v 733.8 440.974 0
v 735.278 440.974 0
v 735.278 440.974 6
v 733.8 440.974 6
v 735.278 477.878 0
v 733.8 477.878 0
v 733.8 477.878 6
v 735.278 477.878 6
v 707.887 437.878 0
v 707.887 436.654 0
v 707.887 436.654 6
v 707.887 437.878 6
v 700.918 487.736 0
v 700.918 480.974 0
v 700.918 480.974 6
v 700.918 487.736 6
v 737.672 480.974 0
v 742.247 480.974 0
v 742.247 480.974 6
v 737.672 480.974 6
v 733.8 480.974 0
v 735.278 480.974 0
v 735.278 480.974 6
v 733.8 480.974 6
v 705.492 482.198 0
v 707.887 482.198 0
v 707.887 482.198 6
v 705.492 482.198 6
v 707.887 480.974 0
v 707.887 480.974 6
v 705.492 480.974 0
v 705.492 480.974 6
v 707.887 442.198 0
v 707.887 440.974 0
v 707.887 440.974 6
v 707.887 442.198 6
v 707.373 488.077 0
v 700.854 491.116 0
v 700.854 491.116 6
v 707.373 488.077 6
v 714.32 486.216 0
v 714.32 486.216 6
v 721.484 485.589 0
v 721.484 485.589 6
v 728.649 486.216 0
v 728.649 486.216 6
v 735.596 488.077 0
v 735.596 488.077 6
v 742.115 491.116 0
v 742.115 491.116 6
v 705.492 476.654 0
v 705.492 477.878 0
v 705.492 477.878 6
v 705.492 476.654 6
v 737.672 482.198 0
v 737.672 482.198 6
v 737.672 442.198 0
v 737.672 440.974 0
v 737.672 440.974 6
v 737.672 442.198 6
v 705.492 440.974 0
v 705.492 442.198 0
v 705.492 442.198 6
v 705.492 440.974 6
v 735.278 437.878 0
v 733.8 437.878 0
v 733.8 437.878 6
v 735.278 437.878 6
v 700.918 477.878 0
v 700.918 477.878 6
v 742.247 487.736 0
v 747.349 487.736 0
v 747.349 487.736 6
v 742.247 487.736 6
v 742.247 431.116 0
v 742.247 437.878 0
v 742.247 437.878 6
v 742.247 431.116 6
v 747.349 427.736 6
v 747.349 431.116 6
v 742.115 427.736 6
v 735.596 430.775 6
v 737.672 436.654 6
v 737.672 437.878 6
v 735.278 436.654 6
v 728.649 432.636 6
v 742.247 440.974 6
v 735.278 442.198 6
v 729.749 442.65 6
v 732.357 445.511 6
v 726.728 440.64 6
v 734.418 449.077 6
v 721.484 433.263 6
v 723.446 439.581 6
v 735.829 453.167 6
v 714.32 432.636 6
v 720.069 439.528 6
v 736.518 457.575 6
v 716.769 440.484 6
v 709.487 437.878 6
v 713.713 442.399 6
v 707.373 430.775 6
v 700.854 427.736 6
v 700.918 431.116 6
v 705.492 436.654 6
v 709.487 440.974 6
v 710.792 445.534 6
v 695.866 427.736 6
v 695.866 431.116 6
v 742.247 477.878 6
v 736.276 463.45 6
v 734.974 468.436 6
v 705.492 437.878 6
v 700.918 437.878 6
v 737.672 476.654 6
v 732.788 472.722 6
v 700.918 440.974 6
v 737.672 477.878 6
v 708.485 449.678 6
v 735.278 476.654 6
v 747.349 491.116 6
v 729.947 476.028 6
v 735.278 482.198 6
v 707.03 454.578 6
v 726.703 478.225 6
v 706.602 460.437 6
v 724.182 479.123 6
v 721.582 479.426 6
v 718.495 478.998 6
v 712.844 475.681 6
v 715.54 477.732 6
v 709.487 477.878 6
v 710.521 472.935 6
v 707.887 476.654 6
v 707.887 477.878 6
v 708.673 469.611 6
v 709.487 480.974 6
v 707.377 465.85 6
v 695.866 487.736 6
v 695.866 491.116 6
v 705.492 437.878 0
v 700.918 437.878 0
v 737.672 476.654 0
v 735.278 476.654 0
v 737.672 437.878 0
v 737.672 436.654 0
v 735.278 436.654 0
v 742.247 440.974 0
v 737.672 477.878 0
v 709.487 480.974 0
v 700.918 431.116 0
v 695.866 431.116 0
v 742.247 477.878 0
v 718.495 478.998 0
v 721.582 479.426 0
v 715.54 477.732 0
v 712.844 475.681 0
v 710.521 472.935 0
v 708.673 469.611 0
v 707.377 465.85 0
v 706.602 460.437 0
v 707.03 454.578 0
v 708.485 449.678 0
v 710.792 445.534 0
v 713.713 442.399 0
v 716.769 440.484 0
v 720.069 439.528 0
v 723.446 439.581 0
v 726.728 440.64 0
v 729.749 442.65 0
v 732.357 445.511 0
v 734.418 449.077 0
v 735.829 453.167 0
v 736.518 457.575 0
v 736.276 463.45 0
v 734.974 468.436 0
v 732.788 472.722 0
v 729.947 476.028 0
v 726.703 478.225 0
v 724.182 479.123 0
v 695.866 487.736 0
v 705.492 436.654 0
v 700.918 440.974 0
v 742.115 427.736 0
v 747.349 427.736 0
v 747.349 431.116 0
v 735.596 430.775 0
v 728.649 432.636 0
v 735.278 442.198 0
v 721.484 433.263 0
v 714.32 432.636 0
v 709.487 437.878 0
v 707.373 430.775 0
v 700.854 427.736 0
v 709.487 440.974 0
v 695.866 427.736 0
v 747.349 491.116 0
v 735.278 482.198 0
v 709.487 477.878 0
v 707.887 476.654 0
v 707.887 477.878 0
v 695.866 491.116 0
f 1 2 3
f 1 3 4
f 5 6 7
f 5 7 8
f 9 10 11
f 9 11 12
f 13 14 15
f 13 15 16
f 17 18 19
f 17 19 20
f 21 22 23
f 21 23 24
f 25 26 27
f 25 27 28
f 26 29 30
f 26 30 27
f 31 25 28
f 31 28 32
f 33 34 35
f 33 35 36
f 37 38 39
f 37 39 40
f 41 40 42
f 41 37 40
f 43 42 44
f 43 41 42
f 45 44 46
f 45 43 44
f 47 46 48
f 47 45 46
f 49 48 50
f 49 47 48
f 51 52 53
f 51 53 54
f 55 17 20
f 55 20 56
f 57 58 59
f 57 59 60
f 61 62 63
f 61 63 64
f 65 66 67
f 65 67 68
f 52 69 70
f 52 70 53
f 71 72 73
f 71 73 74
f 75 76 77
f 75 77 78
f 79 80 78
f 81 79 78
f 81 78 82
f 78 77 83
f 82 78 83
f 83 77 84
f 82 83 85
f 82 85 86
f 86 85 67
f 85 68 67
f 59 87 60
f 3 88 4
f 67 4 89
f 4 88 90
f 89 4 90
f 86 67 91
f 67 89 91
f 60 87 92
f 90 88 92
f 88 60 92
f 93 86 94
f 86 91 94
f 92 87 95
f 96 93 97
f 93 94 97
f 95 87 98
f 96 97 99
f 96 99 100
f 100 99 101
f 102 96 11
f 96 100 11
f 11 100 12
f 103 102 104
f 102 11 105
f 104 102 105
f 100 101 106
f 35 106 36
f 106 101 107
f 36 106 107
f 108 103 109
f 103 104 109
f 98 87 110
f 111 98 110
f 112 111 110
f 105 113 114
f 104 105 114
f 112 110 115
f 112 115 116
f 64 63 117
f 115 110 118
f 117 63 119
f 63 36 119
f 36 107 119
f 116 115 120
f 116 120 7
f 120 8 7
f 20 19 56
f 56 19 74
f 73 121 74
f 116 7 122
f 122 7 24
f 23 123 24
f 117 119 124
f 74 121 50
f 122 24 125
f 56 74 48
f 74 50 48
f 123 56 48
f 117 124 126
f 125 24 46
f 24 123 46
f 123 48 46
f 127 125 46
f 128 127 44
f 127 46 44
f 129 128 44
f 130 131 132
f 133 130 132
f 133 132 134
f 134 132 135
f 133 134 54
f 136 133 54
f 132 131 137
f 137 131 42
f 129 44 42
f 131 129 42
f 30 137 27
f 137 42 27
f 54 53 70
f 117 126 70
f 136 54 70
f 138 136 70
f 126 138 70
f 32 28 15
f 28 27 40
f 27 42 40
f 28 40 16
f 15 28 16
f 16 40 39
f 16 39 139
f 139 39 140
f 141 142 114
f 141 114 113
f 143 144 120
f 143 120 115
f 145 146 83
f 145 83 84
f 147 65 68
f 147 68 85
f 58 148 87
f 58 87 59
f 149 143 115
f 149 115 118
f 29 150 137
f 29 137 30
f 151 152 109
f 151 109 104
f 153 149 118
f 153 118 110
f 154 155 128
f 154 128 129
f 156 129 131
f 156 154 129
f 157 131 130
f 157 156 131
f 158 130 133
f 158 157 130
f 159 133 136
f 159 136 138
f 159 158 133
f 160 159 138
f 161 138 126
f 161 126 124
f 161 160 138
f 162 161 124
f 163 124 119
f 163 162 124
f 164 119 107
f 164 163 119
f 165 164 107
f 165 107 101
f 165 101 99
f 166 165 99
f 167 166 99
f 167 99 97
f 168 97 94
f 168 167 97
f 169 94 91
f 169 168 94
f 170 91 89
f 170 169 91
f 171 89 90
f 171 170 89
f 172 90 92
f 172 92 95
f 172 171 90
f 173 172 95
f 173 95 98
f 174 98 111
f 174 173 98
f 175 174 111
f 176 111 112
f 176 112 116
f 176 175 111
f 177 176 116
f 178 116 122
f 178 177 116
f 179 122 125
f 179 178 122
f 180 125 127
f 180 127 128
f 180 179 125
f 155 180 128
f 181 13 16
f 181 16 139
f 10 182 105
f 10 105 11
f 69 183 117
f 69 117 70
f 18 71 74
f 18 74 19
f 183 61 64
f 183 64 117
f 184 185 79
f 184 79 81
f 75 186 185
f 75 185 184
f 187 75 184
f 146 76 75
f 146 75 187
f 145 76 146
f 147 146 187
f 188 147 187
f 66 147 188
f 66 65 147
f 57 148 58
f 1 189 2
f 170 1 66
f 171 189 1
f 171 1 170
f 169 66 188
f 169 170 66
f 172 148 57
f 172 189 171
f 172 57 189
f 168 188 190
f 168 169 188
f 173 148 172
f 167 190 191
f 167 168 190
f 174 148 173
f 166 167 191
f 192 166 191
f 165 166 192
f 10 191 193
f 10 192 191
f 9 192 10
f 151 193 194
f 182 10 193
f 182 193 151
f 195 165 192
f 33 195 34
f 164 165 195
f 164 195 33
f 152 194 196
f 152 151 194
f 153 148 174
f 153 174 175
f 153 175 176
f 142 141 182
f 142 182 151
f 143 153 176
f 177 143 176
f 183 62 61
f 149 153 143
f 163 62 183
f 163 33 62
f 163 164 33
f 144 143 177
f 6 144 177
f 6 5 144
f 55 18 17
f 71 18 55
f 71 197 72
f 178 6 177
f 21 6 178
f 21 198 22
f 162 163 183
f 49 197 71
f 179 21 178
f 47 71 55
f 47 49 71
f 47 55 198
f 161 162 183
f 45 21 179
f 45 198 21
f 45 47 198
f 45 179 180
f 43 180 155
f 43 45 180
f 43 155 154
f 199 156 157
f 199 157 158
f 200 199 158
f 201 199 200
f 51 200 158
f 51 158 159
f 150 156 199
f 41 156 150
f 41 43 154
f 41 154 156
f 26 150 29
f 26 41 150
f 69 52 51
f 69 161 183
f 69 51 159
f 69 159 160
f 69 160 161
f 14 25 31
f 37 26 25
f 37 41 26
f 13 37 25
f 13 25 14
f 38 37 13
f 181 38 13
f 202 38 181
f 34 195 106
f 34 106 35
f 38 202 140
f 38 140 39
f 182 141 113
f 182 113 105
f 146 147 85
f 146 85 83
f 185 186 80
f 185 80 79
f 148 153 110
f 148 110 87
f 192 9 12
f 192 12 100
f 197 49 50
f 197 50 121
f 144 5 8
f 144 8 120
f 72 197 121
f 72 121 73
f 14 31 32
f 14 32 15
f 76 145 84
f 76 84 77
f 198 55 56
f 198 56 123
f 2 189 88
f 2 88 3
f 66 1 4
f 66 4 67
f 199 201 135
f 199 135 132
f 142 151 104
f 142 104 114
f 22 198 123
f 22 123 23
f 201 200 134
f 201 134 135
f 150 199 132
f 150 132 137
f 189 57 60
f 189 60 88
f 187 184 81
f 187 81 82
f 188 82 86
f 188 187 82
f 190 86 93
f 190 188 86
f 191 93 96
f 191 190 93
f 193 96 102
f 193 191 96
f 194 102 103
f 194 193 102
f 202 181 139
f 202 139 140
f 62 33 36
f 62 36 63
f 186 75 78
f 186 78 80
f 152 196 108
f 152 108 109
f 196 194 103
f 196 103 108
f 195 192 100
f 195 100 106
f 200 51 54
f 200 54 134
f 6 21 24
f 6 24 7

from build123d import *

# Parameters (mm, degrees)
SKETCH1_RX          = 20
SKETCH1_RY          = 15
BOSS_EXTRUDE1_DEPTH = 6


with BuildPart() as part:
    # Sketch1 → Boss-Extrude1 (new body)
    with BuildSketch(Plane.XY):
        with BuildLine():
            Line((735.278050496, 436.653824982), (737.672420097, 436.653824982))
            Line((737.672420097, 436.653824982), (737.672420097, 437.878226994))
            Line((737.672420097, 437.878226994), (742.24679609, 437.878226994))
            Line((742.24679609, 437.878226994), (742.24679609, 431.116067))
            Line((742.24679609, 431.116067), (747.348599543, 431.116067))
            Line((747.348599543, 431.116067), (747.348599543, 427.736067))
            Line((747.348599543, 427.736067), (742.114877809, 427.736067))
            ThreePointArc((742.114877809, 427.736067), (721.48448246, 433.262998961), (700.85408711, 427.736067))
            Line((700.85408711, 427.736067), (695.865635692, 427.736067))
            Line((695.865635692, 427.736067), (695.865635692, 431.116067))
            Line((695.865635692, 431.116067), (700.917916144, 431.116067))
            Line((700.917916144, 431.116067), (700.917916144, 437.878226994))
            Line((700.917916144, 437.878226994), (705.492292137, 437.878226994))
            Line((705.492292137, 437.878226994), (705.492292137, 436.653824982))
            Line((705.492292137, 436.653824982), (707.886661739, 436.653824982))
            Line((707.886661739, 436.653824982), (707.886661739, 437.878226994))
            Line((707.886661739, 437.878226994), (709.486661739, 437.878226994))
            Line((709.486661739, 437.878226994), (709.486661739, 440.973907006))
            Line((709.486661739, 440.973907006), (707.886661739, 440.973907006))
            Line((707.886661739, 440.973907006), (707.886661739, 442.198309018))
            Line((707.886661739, 442.198309018), (705.492292137, 442.198309018))
            Line((705.492292137, 442.198309018), (705.492292137, 440.973907006))
            Line((705.492292137, 440.973907006), (700.917916144, 440.973907006))
            Line((700.917916144, 440.973907006), (700.917916144, 459.426067))
            Line((700.917916144, 459.426067), (700.917916144, 477.878226994))
            Line((700.917916144, 477.878226994), (705.492292137, 477.878226994))
            Line((705.492292137, 477.878226994), (705.492292137, 476.653824982))
            Line((705.492292137, 476.653824982), (707.886661739, 476.653824982))
            Line((707.886661739, 476.653824982), (707.886661739, 477.878226994))
            Line((707.886661739, 477.878226994), (709.486661739, 477.878226994))
            Line((709.486661739, 477.878226994), (709.486661739, 480.973907006))
            Line((709.486661739, 480.973907006), (707.886661739, 480.973907006))
            Line((707.886661739, 480.973907006), (707.886661739, 482.198309018))
            Line((707.886661739, 482.198309018), (705.492292137, 482.198309018))
            Line((705.492292137, 482.198309018), (705.492292137, 480.973907006))
            Line((705.492292137, 480.973907006), (700.917916144, 480.973907006))
            Line((700.917916144, 480.973907006), (700.917916144, 487.736067))
            Line((700.917916144, 487.736067), (695.865635692, 487.736067))
            Line((695.865635692, 487.736067), (695.865635692, 491.116067))
            Line((695.865635692, 491.116067), (700.85408711, 491.116067))
            ThreePointArc((700.85408711, 491.116067), (721.48448246, 485.589135038), (742.114877809, 491.116067))
            Line((742.114877809, 491.116067), (747.348599543, 491.116067))
            Line((747.348599543, 491.116067), (747.348599543, 487.736067))
            Line((747.348599543, 487.736067), (742.24679609, 487.736067))
            Line((742.24679609, 487.736067), (742.24679609, 480.973907006))
            Line((742.24679609, 480.973907006), (737.672420097, 480.973907006))
            Line((737.672420097, 480.973907006), (737.672420097, 482.198309018))
            Line((737.672420097, 482.198309018), (735.278050496, 482.198309018))
            Line((735.278050496, 482.198309018), (735.278050496, 480.973907006))
            Line((735.278050496, 480.973907006), (733.799948182, 480.973907006))
            Line((733.799948182, 480.973907006), (733.799948182, 477.878226994))
            Line((733.799948182, 477.878226994), (735.278050496, 477.878226994))
            Line((735.278050496, 477.878226994), (735.278050496, 476.653824982))
            Line((735.278050496, 476.653824982), (737.672420097, 476.653824982))
            Line((737.672420097, 476.653824982), (737.672420097, 477.878226994))
            Line((737.672420097, 477.878226994), (742.24679609, 477.878226994))
            Line((742.24679609, 477.878226994), (742.24679609, 459.426067))
            Line((742.24679609, 459.426067), (742.24679609, 440.973907006))
            Line((742.24679609, 440.973907006), (737.672420097, 440.973907006))
            Line((737.672420097, 440.973907006), (737.672420097, 442.198309018))
            Line((737.672420097, 442.198309018), (735.278050496, 442.198309018))
            Line((735.278050496, 442.198309018), (735.278050496, 440.973907006))
            Line((735.278050496, 440.973907006), (733.799948182, 440.973907006))
            Line((733.799948182, 440.973907006), (733.799948182, 437.878226994))
            Line((733.799948182, 437.878226994), (735.278050496, 437.878226994))
            Line((735.278050496, 437.878226994), (735.278050496, 436.653824982))
        make_face()
        with Locations(Location((721.582356117, 459.426067), (0, 0, 90))):
            Ellipse(SKETCH1_RX, SKETCH1_RY, mode=Mode.SUBTRACT)
    extrude(amount=BOSS_EXTRUDE1_DEPTH)


solid = part.part
